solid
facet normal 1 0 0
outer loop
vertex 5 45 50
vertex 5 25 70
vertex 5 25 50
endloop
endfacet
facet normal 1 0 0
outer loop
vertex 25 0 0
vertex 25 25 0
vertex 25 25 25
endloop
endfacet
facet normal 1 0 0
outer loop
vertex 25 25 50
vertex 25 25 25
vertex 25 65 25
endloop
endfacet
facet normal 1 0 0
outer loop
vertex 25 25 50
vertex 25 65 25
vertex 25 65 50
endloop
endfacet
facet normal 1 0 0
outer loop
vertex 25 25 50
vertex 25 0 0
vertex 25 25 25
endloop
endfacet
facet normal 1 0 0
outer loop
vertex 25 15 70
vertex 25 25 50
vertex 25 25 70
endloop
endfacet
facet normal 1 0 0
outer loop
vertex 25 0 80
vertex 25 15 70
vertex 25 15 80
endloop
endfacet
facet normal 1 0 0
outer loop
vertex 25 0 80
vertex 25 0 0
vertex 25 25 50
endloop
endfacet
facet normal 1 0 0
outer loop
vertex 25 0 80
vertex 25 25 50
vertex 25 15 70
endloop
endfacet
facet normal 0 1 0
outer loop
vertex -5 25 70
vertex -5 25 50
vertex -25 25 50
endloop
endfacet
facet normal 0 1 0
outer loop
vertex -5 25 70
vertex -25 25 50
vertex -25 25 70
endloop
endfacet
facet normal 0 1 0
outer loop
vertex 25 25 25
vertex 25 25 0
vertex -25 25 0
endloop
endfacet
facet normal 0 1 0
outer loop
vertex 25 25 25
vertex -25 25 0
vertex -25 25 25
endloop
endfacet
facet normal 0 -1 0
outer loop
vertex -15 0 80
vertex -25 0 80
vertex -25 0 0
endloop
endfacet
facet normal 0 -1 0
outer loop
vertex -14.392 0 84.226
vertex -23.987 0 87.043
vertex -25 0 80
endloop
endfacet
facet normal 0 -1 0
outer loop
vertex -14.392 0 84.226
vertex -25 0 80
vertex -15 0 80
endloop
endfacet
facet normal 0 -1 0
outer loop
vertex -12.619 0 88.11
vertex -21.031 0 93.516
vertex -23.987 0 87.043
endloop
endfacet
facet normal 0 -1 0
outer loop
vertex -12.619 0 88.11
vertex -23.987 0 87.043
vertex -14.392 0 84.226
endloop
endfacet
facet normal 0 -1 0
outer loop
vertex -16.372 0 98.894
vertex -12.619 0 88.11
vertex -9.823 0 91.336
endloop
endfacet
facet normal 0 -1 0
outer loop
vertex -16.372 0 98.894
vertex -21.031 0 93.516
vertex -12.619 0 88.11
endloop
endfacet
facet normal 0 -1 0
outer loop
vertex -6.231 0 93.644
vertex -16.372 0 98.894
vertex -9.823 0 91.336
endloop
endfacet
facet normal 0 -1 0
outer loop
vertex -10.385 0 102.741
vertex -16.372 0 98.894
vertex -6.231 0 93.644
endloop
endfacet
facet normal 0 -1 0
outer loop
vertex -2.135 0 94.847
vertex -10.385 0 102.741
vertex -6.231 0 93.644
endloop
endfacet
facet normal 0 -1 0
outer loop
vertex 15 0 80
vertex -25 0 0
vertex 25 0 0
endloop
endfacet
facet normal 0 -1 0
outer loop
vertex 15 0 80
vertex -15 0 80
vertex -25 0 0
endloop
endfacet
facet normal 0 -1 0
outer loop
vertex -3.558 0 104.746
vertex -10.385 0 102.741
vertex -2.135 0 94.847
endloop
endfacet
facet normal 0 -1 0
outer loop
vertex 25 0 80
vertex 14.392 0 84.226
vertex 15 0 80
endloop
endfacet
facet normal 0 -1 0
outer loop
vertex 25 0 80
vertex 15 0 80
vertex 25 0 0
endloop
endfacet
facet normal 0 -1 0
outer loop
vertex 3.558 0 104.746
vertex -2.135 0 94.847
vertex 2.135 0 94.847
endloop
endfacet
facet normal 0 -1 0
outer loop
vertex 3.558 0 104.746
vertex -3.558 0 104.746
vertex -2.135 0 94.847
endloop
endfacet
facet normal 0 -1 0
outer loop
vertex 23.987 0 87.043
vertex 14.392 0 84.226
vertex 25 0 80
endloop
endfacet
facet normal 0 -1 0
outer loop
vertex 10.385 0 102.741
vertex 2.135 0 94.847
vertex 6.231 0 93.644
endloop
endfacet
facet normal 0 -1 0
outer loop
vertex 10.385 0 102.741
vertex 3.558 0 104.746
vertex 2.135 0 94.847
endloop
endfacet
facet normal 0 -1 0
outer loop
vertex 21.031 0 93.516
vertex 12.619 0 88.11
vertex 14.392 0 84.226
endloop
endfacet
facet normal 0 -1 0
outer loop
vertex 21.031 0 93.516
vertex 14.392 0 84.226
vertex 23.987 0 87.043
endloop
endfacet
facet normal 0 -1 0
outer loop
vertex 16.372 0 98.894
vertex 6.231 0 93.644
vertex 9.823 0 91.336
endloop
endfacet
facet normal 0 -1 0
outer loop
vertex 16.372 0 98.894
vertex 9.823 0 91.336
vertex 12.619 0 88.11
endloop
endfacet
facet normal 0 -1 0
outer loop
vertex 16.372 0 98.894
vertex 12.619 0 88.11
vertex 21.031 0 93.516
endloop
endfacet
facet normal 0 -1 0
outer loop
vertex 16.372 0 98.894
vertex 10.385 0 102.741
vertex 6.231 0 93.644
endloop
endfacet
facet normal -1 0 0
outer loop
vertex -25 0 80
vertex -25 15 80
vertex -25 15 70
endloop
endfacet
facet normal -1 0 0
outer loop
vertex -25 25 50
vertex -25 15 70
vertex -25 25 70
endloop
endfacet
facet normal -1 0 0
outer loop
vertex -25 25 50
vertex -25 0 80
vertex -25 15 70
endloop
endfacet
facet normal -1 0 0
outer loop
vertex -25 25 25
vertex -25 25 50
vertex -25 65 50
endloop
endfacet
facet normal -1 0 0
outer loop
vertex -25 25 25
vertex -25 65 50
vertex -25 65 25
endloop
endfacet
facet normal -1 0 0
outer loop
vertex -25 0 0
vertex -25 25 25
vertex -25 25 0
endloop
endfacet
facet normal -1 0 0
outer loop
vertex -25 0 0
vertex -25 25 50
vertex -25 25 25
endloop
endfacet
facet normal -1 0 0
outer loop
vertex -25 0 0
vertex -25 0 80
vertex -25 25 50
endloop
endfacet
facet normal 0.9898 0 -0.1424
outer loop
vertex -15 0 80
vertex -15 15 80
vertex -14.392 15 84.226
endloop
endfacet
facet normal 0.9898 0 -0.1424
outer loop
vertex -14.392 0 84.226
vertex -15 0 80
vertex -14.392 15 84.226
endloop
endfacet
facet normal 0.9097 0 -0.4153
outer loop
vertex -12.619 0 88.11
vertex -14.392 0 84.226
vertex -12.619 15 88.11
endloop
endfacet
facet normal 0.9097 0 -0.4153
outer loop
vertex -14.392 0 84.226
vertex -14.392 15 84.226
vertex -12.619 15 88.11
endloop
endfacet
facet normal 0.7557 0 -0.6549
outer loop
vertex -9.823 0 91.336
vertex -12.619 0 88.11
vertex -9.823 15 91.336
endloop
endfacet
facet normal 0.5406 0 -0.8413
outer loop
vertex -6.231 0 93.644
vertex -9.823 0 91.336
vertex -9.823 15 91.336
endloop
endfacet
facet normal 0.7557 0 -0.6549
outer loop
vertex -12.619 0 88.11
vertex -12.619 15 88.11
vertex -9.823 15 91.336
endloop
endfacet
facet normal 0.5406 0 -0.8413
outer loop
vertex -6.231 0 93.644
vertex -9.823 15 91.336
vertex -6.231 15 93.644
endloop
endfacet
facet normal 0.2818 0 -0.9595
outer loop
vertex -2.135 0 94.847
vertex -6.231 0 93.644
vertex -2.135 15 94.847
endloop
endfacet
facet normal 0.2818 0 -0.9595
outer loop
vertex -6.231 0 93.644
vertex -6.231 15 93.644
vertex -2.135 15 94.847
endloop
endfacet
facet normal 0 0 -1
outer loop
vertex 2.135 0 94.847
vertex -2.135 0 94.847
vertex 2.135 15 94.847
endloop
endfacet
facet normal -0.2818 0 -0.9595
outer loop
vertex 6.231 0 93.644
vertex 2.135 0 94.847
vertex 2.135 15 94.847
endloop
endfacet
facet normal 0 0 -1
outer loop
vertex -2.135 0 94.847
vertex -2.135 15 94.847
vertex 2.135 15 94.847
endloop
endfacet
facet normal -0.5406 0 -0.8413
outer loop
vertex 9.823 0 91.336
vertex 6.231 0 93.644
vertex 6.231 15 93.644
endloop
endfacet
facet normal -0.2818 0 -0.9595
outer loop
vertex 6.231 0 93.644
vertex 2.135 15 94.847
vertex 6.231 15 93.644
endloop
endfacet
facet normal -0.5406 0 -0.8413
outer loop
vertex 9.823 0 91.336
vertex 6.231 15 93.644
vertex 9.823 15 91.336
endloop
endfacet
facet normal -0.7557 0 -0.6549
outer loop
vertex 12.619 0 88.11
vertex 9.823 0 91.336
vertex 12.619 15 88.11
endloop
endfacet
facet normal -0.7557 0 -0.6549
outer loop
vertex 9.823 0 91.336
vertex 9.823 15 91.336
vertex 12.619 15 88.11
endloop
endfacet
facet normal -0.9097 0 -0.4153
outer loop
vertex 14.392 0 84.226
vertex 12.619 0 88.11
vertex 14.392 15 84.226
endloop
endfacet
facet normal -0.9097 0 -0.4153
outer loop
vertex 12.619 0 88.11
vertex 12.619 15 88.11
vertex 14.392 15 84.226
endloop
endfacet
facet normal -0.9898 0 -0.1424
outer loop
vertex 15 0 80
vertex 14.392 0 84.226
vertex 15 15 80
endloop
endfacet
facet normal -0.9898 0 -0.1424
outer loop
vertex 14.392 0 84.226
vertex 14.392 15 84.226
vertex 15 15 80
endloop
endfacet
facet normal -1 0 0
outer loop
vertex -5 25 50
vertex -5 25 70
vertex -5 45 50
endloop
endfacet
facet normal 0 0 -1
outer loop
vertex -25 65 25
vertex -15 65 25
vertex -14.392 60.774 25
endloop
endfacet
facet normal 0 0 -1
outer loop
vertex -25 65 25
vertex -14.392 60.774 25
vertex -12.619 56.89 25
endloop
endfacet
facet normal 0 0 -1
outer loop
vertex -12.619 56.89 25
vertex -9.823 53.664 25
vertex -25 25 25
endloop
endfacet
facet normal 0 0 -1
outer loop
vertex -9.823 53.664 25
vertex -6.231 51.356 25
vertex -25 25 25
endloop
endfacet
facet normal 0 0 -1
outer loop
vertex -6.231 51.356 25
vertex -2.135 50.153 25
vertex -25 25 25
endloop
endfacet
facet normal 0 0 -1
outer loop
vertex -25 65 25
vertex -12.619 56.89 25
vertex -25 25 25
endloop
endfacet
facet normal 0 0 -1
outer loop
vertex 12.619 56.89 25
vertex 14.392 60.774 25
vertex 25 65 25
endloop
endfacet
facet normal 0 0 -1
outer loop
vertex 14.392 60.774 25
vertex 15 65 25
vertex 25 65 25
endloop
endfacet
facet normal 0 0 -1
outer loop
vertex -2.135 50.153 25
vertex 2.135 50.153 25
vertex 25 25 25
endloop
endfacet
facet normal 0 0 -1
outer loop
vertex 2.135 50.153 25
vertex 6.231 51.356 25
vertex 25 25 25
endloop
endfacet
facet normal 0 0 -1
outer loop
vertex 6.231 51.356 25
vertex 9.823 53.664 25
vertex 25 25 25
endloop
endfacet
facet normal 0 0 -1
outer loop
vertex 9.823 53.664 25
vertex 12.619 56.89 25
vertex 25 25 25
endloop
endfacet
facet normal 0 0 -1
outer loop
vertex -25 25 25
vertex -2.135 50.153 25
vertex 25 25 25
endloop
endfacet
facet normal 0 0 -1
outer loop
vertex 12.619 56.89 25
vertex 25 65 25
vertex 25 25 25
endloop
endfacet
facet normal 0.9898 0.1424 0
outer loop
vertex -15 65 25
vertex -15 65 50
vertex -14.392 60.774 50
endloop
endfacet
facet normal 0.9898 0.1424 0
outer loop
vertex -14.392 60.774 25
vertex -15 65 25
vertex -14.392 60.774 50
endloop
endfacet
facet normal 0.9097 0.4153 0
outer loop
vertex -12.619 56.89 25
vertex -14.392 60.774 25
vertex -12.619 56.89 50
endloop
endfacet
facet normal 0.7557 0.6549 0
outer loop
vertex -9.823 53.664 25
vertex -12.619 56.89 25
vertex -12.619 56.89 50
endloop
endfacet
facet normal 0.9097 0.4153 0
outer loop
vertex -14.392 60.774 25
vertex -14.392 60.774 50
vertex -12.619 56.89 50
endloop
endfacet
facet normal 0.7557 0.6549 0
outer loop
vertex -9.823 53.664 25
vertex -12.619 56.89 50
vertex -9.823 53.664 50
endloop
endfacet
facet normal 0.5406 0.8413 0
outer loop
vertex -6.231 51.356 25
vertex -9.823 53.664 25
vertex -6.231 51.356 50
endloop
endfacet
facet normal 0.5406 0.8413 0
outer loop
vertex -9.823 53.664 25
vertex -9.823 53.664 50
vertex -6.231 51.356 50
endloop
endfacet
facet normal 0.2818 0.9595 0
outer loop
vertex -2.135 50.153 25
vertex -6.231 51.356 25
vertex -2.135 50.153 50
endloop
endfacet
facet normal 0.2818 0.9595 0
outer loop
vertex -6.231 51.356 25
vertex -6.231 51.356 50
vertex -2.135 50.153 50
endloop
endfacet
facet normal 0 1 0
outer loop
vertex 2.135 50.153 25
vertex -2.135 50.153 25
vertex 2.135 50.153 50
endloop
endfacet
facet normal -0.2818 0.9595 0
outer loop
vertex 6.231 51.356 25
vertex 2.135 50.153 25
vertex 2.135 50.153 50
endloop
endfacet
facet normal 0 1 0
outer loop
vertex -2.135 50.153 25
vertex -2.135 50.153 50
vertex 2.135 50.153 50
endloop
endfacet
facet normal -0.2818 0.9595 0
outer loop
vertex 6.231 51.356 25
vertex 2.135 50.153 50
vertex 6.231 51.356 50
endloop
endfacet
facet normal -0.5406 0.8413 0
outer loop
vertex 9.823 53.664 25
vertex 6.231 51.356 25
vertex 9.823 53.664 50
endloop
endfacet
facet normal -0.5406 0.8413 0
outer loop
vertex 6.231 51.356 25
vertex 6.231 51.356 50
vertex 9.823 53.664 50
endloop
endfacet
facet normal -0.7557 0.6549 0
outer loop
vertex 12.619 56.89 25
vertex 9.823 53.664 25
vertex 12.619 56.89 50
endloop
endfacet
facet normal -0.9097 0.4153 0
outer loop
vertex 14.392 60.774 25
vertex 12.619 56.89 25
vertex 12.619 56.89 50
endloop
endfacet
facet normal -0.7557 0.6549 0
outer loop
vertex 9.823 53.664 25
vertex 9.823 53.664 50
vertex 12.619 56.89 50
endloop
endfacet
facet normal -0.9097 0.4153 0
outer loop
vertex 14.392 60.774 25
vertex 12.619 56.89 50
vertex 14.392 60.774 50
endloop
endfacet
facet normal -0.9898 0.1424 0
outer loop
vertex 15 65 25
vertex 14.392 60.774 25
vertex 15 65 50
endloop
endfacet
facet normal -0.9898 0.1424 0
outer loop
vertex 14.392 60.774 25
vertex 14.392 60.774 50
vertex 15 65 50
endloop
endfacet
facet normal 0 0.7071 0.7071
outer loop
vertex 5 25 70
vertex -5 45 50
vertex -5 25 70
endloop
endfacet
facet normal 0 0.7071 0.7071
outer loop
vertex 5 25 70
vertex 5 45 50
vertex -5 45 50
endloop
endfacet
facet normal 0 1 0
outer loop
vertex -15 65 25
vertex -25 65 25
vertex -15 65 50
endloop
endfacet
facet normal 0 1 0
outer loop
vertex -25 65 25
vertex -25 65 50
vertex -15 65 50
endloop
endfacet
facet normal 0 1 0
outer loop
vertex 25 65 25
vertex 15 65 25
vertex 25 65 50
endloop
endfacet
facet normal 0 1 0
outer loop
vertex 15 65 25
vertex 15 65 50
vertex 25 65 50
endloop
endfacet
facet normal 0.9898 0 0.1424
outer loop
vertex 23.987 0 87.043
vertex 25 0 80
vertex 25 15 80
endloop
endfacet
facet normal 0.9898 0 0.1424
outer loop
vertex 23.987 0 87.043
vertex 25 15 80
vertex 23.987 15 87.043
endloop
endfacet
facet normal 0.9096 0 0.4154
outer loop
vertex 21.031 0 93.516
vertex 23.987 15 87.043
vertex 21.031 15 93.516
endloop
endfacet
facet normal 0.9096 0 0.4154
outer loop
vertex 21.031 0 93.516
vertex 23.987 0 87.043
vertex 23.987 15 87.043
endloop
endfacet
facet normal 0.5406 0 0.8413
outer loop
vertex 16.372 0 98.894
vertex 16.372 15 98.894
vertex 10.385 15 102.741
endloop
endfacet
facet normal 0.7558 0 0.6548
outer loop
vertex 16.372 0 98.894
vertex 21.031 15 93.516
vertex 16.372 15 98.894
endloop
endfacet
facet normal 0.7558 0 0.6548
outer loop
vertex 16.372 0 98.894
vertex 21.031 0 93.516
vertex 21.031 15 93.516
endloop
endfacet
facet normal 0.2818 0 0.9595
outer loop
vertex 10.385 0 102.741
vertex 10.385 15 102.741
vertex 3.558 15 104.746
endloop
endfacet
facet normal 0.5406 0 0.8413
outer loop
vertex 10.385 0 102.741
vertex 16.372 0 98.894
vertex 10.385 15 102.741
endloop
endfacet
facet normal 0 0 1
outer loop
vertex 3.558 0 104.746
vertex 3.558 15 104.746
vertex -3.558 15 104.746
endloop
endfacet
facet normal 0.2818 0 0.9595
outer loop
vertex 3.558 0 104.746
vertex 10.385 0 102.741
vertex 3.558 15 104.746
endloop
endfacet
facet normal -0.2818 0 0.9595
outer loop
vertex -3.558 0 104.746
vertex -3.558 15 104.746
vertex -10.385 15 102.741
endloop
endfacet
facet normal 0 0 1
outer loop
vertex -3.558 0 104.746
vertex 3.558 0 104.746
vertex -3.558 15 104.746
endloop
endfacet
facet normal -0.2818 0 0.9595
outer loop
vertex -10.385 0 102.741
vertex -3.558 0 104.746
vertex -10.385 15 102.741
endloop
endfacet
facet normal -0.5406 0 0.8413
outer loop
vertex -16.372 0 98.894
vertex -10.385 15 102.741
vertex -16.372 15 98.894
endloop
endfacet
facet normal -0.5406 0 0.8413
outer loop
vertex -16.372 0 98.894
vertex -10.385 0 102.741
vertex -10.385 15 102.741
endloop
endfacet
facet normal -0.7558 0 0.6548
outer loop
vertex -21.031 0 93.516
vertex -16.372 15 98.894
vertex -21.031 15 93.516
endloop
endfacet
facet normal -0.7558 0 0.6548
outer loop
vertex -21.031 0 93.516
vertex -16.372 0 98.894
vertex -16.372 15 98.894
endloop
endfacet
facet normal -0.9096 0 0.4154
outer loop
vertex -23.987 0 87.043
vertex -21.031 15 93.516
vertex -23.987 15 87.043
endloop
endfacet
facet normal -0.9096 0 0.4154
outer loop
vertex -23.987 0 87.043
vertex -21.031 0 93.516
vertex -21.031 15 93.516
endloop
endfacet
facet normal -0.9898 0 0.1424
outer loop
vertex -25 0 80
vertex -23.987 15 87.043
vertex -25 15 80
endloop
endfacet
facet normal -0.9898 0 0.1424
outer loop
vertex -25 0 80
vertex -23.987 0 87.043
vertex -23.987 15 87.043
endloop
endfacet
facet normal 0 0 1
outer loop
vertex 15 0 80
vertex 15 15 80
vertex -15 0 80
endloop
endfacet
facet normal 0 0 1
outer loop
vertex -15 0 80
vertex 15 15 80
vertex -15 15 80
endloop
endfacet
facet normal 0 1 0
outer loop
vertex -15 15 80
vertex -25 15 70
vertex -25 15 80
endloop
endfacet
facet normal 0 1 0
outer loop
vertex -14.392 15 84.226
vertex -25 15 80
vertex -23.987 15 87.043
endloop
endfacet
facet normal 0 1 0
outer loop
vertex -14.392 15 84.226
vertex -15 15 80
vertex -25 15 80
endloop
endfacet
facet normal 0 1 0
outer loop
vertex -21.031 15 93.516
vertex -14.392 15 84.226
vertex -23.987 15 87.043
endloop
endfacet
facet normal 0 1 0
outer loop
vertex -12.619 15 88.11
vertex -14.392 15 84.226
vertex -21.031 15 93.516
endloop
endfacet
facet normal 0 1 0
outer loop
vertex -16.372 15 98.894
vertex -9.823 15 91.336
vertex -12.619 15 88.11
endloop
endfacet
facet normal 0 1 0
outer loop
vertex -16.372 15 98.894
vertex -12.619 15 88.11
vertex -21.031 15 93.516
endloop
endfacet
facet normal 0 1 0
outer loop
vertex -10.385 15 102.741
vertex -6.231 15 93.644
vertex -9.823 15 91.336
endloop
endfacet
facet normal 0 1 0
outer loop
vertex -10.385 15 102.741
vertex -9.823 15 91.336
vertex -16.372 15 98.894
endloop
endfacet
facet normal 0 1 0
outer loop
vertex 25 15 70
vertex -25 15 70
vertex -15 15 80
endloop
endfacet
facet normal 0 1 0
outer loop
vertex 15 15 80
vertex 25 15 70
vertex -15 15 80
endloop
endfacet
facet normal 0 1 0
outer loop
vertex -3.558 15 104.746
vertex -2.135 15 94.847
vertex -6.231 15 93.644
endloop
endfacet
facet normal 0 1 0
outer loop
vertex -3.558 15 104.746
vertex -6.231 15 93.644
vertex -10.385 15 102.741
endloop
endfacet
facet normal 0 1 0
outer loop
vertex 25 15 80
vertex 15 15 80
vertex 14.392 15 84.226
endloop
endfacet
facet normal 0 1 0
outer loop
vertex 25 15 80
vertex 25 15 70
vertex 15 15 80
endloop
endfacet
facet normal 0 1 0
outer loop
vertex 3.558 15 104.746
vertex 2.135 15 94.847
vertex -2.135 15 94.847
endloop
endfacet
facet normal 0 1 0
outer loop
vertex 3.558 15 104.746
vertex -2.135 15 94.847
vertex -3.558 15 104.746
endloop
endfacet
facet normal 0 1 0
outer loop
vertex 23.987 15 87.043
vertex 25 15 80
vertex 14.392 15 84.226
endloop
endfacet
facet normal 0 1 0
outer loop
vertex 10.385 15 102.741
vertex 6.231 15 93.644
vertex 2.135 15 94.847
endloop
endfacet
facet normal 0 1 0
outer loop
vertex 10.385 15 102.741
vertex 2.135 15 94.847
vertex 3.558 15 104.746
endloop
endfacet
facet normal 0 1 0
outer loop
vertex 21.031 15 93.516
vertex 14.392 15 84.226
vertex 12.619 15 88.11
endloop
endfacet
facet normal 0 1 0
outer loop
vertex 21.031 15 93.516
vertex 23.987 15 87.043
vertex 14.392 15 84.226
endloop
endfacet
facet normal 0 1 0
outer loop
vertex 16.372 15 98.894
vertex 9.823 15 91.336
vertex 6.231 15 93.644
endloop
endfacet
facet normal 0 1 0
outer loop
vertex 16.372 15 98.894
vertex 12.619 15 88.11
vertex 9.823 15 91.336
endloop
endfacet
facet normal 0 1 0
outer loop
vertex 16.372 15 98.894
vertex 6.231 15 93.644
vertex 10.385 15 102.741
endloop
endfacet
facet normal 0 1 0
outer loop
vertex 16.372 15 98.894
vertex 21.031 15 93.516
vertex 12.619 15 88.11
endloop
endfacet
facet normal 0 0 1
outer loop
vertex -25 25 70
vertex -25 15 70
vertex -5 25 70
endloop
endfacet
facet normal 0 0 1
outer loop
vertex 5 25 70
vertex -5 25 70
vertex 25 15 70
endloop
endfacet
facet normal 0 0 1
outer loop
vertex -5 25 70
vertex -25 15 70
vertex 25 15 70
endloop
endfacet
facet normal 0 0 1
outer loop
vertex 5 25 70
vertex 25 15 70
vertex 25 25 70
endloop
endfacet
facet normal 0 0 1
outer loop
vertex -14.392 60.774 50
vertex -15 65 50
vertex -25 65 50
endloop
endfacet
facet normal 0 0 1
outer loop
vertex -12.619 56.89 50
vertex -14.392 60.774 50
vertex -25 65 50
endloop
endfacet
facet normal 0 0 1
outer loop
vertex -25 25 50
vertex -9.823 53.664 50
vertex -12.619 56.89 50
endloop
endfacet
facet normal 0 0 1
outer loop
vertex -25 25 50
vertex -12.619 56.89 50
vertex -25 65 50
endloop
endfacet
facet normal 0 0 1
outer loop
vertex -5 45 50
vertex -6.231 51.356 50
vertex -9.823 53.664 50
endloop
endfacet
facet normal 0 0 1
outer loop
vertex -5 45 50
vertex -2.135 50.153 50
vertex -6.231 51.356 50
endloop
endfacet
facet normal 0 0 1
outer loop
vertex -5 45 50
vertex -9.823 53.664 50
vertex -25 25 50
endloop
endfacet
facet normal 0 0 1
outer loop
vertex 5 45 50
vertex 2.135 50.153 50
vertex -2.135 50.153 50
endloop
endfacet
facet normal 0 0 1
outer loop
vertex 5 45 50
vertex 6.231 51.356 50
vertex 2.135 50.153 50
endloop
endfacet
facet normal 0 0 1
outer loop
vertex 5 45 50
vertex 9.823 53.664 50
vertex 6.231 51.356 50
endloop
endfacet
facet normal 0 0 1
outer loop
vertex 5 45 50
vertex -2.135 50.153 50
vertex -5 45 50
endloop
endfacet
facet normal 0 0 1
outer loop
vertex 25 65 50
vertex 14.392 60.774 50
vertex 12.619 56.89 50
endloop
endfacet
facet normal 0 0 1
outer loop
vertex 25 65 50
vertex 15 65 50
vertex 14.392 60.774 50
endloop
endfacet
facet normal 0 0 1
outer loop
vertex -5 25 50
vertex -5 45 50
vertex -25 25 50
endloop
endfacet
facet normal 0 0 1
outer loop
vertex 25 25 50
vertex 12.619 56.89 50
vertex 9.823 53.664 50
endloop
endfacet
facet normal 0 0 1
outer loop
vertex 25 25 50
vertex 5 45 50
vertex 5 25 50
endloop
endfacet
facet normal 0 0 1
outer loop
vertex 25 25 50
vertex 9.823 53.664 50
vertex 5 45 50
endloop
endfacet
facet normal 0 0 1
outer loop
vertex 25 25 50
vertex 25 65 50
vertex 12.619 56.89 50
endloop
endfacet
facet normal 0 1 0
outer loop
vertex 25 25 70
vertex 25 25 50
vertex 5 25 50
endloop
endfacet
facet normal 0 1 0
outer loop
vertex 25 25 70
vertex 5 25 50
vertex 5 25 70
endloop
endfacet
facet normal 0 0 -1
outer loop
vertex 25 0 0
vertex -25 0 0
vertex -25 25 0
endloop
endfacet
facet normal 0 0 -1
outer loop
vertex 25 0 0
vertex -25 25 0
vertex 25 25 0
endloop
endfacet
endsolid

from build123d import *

# Parameters (mm, degrees)
PAD_DEPTH            = 65
SKETCH001_W          = 25
SKETCH001_H          = 40
POCKET_DEPTH         = 50.001
SKETCH002_W          = 20
SKETCH002_H          = 40
POCKET001_DEPTH      = 50.001
SKETCH003_W          = 50
SKETCH003_H          = 35
POCKET002_DEPTH      = 25.001
POCKET002_DEPTH_BACK = -25.001
POCKET003_DEPTH      = 15.001
PAD001_DEPTH         = 5
POCKET004_DEPTH      = 50.001


with BuildPart() as part:
    # Sketch → Pad (new body)
    with BuildSketch(Plane.XZ):
        with BuildLine():
            Line((-25, 80), (-25, 0))
            Line((-25, 0), (25, 0))
            Line((25, 0), (25, 80))
            ThreePointArc((25, 80), (0, 105), (-25, 80))
        make_face()
    extrude(amount=-PAD_DEPTH)

    # Sketch001 (on Face3 of Pad) → Pocket (cut, through all)
    with BuildSketch(Plane(origin=(25, 0, 0), x_dir=(0, 0, 1), z_dir=(1, 0, 0))):
        with Locations((12.5, -45)):
            Rectangle(SKETCH001_W, SKETCH001_H)
    extrude(amount=-POCKET_DEPTH, mode=Mode.SUBTRACT)

    # Sketch002 (on Face8 of Pocket) → Pocket001 (cut, through all)
    with BuildSketch(Plane(origin=(25, 0, 0), x_dir=(0, 0, 1), z_dir=(1, 0, 0))):
        with Locations((60, -45)):
            Rectangle(SKETCH002_W, SKETCH002_H)
    extrude(amount=-POCKET001_DEPTH, mode=Mode.SUBTRACT)

    # Sketch003 → Pocket002 (cut, two sides)
    with BuildSketch(Plane.YZ) as pocket002_sk:
        with Locations((40, 87.5)):
            Rectangle(SKETCH003_W, SKETCH003_H)
    extrude(amount=-POCKET002_DEPTH, mode=Mode.SUBTRACT)
    extrude(pocket002_sk.sketch, amount=-POCKET002_DEPTH_BACK, mode=Mode.SUBTRACT)

    # Sketch004 (on Face10 of Pocket002) → Pocket003 (cut, through all)
    with BuildSketch(Plane(origin=(0, 15, 0), x_dir=(1, 0, 0), z_dir=(0, 1, 0))):
        with BuildLine():
            ThreePointArc((-15, -80), (0, -95), (15, -80))
            Line((15, -80), (-15, -80))
        make_face()
    extrude(amount=-POCKET003_DEPTH, mode=Mode.SUBTRACT)

    # Sketch005 → Pad001 (join, symmetric)
    with BuildSketch(Plane.YZ):
        Polygon((25, 70), (25, 50), (45, 50), align=None)
    extrude(amount=PAD001_DEPTH, both=True)

    # Sketch006 (on Face7 of Pad001) → Pocket004 (cut, through all)
    with BuildSketch(Plane(origin=(0, 0, 50), x_dir=(-1, 0, 0), z_dir=(0, 0, 1))):
        with BuildLine():
            ThreePointArc((15, -65), (0, -50), (-15, -65))
            Line((-15, -65), (15, -65))
        make_face()
    extrude(amount=-POCKET004_DEPTH, mode=Mode.SUBTRACT)


solid = part.part
